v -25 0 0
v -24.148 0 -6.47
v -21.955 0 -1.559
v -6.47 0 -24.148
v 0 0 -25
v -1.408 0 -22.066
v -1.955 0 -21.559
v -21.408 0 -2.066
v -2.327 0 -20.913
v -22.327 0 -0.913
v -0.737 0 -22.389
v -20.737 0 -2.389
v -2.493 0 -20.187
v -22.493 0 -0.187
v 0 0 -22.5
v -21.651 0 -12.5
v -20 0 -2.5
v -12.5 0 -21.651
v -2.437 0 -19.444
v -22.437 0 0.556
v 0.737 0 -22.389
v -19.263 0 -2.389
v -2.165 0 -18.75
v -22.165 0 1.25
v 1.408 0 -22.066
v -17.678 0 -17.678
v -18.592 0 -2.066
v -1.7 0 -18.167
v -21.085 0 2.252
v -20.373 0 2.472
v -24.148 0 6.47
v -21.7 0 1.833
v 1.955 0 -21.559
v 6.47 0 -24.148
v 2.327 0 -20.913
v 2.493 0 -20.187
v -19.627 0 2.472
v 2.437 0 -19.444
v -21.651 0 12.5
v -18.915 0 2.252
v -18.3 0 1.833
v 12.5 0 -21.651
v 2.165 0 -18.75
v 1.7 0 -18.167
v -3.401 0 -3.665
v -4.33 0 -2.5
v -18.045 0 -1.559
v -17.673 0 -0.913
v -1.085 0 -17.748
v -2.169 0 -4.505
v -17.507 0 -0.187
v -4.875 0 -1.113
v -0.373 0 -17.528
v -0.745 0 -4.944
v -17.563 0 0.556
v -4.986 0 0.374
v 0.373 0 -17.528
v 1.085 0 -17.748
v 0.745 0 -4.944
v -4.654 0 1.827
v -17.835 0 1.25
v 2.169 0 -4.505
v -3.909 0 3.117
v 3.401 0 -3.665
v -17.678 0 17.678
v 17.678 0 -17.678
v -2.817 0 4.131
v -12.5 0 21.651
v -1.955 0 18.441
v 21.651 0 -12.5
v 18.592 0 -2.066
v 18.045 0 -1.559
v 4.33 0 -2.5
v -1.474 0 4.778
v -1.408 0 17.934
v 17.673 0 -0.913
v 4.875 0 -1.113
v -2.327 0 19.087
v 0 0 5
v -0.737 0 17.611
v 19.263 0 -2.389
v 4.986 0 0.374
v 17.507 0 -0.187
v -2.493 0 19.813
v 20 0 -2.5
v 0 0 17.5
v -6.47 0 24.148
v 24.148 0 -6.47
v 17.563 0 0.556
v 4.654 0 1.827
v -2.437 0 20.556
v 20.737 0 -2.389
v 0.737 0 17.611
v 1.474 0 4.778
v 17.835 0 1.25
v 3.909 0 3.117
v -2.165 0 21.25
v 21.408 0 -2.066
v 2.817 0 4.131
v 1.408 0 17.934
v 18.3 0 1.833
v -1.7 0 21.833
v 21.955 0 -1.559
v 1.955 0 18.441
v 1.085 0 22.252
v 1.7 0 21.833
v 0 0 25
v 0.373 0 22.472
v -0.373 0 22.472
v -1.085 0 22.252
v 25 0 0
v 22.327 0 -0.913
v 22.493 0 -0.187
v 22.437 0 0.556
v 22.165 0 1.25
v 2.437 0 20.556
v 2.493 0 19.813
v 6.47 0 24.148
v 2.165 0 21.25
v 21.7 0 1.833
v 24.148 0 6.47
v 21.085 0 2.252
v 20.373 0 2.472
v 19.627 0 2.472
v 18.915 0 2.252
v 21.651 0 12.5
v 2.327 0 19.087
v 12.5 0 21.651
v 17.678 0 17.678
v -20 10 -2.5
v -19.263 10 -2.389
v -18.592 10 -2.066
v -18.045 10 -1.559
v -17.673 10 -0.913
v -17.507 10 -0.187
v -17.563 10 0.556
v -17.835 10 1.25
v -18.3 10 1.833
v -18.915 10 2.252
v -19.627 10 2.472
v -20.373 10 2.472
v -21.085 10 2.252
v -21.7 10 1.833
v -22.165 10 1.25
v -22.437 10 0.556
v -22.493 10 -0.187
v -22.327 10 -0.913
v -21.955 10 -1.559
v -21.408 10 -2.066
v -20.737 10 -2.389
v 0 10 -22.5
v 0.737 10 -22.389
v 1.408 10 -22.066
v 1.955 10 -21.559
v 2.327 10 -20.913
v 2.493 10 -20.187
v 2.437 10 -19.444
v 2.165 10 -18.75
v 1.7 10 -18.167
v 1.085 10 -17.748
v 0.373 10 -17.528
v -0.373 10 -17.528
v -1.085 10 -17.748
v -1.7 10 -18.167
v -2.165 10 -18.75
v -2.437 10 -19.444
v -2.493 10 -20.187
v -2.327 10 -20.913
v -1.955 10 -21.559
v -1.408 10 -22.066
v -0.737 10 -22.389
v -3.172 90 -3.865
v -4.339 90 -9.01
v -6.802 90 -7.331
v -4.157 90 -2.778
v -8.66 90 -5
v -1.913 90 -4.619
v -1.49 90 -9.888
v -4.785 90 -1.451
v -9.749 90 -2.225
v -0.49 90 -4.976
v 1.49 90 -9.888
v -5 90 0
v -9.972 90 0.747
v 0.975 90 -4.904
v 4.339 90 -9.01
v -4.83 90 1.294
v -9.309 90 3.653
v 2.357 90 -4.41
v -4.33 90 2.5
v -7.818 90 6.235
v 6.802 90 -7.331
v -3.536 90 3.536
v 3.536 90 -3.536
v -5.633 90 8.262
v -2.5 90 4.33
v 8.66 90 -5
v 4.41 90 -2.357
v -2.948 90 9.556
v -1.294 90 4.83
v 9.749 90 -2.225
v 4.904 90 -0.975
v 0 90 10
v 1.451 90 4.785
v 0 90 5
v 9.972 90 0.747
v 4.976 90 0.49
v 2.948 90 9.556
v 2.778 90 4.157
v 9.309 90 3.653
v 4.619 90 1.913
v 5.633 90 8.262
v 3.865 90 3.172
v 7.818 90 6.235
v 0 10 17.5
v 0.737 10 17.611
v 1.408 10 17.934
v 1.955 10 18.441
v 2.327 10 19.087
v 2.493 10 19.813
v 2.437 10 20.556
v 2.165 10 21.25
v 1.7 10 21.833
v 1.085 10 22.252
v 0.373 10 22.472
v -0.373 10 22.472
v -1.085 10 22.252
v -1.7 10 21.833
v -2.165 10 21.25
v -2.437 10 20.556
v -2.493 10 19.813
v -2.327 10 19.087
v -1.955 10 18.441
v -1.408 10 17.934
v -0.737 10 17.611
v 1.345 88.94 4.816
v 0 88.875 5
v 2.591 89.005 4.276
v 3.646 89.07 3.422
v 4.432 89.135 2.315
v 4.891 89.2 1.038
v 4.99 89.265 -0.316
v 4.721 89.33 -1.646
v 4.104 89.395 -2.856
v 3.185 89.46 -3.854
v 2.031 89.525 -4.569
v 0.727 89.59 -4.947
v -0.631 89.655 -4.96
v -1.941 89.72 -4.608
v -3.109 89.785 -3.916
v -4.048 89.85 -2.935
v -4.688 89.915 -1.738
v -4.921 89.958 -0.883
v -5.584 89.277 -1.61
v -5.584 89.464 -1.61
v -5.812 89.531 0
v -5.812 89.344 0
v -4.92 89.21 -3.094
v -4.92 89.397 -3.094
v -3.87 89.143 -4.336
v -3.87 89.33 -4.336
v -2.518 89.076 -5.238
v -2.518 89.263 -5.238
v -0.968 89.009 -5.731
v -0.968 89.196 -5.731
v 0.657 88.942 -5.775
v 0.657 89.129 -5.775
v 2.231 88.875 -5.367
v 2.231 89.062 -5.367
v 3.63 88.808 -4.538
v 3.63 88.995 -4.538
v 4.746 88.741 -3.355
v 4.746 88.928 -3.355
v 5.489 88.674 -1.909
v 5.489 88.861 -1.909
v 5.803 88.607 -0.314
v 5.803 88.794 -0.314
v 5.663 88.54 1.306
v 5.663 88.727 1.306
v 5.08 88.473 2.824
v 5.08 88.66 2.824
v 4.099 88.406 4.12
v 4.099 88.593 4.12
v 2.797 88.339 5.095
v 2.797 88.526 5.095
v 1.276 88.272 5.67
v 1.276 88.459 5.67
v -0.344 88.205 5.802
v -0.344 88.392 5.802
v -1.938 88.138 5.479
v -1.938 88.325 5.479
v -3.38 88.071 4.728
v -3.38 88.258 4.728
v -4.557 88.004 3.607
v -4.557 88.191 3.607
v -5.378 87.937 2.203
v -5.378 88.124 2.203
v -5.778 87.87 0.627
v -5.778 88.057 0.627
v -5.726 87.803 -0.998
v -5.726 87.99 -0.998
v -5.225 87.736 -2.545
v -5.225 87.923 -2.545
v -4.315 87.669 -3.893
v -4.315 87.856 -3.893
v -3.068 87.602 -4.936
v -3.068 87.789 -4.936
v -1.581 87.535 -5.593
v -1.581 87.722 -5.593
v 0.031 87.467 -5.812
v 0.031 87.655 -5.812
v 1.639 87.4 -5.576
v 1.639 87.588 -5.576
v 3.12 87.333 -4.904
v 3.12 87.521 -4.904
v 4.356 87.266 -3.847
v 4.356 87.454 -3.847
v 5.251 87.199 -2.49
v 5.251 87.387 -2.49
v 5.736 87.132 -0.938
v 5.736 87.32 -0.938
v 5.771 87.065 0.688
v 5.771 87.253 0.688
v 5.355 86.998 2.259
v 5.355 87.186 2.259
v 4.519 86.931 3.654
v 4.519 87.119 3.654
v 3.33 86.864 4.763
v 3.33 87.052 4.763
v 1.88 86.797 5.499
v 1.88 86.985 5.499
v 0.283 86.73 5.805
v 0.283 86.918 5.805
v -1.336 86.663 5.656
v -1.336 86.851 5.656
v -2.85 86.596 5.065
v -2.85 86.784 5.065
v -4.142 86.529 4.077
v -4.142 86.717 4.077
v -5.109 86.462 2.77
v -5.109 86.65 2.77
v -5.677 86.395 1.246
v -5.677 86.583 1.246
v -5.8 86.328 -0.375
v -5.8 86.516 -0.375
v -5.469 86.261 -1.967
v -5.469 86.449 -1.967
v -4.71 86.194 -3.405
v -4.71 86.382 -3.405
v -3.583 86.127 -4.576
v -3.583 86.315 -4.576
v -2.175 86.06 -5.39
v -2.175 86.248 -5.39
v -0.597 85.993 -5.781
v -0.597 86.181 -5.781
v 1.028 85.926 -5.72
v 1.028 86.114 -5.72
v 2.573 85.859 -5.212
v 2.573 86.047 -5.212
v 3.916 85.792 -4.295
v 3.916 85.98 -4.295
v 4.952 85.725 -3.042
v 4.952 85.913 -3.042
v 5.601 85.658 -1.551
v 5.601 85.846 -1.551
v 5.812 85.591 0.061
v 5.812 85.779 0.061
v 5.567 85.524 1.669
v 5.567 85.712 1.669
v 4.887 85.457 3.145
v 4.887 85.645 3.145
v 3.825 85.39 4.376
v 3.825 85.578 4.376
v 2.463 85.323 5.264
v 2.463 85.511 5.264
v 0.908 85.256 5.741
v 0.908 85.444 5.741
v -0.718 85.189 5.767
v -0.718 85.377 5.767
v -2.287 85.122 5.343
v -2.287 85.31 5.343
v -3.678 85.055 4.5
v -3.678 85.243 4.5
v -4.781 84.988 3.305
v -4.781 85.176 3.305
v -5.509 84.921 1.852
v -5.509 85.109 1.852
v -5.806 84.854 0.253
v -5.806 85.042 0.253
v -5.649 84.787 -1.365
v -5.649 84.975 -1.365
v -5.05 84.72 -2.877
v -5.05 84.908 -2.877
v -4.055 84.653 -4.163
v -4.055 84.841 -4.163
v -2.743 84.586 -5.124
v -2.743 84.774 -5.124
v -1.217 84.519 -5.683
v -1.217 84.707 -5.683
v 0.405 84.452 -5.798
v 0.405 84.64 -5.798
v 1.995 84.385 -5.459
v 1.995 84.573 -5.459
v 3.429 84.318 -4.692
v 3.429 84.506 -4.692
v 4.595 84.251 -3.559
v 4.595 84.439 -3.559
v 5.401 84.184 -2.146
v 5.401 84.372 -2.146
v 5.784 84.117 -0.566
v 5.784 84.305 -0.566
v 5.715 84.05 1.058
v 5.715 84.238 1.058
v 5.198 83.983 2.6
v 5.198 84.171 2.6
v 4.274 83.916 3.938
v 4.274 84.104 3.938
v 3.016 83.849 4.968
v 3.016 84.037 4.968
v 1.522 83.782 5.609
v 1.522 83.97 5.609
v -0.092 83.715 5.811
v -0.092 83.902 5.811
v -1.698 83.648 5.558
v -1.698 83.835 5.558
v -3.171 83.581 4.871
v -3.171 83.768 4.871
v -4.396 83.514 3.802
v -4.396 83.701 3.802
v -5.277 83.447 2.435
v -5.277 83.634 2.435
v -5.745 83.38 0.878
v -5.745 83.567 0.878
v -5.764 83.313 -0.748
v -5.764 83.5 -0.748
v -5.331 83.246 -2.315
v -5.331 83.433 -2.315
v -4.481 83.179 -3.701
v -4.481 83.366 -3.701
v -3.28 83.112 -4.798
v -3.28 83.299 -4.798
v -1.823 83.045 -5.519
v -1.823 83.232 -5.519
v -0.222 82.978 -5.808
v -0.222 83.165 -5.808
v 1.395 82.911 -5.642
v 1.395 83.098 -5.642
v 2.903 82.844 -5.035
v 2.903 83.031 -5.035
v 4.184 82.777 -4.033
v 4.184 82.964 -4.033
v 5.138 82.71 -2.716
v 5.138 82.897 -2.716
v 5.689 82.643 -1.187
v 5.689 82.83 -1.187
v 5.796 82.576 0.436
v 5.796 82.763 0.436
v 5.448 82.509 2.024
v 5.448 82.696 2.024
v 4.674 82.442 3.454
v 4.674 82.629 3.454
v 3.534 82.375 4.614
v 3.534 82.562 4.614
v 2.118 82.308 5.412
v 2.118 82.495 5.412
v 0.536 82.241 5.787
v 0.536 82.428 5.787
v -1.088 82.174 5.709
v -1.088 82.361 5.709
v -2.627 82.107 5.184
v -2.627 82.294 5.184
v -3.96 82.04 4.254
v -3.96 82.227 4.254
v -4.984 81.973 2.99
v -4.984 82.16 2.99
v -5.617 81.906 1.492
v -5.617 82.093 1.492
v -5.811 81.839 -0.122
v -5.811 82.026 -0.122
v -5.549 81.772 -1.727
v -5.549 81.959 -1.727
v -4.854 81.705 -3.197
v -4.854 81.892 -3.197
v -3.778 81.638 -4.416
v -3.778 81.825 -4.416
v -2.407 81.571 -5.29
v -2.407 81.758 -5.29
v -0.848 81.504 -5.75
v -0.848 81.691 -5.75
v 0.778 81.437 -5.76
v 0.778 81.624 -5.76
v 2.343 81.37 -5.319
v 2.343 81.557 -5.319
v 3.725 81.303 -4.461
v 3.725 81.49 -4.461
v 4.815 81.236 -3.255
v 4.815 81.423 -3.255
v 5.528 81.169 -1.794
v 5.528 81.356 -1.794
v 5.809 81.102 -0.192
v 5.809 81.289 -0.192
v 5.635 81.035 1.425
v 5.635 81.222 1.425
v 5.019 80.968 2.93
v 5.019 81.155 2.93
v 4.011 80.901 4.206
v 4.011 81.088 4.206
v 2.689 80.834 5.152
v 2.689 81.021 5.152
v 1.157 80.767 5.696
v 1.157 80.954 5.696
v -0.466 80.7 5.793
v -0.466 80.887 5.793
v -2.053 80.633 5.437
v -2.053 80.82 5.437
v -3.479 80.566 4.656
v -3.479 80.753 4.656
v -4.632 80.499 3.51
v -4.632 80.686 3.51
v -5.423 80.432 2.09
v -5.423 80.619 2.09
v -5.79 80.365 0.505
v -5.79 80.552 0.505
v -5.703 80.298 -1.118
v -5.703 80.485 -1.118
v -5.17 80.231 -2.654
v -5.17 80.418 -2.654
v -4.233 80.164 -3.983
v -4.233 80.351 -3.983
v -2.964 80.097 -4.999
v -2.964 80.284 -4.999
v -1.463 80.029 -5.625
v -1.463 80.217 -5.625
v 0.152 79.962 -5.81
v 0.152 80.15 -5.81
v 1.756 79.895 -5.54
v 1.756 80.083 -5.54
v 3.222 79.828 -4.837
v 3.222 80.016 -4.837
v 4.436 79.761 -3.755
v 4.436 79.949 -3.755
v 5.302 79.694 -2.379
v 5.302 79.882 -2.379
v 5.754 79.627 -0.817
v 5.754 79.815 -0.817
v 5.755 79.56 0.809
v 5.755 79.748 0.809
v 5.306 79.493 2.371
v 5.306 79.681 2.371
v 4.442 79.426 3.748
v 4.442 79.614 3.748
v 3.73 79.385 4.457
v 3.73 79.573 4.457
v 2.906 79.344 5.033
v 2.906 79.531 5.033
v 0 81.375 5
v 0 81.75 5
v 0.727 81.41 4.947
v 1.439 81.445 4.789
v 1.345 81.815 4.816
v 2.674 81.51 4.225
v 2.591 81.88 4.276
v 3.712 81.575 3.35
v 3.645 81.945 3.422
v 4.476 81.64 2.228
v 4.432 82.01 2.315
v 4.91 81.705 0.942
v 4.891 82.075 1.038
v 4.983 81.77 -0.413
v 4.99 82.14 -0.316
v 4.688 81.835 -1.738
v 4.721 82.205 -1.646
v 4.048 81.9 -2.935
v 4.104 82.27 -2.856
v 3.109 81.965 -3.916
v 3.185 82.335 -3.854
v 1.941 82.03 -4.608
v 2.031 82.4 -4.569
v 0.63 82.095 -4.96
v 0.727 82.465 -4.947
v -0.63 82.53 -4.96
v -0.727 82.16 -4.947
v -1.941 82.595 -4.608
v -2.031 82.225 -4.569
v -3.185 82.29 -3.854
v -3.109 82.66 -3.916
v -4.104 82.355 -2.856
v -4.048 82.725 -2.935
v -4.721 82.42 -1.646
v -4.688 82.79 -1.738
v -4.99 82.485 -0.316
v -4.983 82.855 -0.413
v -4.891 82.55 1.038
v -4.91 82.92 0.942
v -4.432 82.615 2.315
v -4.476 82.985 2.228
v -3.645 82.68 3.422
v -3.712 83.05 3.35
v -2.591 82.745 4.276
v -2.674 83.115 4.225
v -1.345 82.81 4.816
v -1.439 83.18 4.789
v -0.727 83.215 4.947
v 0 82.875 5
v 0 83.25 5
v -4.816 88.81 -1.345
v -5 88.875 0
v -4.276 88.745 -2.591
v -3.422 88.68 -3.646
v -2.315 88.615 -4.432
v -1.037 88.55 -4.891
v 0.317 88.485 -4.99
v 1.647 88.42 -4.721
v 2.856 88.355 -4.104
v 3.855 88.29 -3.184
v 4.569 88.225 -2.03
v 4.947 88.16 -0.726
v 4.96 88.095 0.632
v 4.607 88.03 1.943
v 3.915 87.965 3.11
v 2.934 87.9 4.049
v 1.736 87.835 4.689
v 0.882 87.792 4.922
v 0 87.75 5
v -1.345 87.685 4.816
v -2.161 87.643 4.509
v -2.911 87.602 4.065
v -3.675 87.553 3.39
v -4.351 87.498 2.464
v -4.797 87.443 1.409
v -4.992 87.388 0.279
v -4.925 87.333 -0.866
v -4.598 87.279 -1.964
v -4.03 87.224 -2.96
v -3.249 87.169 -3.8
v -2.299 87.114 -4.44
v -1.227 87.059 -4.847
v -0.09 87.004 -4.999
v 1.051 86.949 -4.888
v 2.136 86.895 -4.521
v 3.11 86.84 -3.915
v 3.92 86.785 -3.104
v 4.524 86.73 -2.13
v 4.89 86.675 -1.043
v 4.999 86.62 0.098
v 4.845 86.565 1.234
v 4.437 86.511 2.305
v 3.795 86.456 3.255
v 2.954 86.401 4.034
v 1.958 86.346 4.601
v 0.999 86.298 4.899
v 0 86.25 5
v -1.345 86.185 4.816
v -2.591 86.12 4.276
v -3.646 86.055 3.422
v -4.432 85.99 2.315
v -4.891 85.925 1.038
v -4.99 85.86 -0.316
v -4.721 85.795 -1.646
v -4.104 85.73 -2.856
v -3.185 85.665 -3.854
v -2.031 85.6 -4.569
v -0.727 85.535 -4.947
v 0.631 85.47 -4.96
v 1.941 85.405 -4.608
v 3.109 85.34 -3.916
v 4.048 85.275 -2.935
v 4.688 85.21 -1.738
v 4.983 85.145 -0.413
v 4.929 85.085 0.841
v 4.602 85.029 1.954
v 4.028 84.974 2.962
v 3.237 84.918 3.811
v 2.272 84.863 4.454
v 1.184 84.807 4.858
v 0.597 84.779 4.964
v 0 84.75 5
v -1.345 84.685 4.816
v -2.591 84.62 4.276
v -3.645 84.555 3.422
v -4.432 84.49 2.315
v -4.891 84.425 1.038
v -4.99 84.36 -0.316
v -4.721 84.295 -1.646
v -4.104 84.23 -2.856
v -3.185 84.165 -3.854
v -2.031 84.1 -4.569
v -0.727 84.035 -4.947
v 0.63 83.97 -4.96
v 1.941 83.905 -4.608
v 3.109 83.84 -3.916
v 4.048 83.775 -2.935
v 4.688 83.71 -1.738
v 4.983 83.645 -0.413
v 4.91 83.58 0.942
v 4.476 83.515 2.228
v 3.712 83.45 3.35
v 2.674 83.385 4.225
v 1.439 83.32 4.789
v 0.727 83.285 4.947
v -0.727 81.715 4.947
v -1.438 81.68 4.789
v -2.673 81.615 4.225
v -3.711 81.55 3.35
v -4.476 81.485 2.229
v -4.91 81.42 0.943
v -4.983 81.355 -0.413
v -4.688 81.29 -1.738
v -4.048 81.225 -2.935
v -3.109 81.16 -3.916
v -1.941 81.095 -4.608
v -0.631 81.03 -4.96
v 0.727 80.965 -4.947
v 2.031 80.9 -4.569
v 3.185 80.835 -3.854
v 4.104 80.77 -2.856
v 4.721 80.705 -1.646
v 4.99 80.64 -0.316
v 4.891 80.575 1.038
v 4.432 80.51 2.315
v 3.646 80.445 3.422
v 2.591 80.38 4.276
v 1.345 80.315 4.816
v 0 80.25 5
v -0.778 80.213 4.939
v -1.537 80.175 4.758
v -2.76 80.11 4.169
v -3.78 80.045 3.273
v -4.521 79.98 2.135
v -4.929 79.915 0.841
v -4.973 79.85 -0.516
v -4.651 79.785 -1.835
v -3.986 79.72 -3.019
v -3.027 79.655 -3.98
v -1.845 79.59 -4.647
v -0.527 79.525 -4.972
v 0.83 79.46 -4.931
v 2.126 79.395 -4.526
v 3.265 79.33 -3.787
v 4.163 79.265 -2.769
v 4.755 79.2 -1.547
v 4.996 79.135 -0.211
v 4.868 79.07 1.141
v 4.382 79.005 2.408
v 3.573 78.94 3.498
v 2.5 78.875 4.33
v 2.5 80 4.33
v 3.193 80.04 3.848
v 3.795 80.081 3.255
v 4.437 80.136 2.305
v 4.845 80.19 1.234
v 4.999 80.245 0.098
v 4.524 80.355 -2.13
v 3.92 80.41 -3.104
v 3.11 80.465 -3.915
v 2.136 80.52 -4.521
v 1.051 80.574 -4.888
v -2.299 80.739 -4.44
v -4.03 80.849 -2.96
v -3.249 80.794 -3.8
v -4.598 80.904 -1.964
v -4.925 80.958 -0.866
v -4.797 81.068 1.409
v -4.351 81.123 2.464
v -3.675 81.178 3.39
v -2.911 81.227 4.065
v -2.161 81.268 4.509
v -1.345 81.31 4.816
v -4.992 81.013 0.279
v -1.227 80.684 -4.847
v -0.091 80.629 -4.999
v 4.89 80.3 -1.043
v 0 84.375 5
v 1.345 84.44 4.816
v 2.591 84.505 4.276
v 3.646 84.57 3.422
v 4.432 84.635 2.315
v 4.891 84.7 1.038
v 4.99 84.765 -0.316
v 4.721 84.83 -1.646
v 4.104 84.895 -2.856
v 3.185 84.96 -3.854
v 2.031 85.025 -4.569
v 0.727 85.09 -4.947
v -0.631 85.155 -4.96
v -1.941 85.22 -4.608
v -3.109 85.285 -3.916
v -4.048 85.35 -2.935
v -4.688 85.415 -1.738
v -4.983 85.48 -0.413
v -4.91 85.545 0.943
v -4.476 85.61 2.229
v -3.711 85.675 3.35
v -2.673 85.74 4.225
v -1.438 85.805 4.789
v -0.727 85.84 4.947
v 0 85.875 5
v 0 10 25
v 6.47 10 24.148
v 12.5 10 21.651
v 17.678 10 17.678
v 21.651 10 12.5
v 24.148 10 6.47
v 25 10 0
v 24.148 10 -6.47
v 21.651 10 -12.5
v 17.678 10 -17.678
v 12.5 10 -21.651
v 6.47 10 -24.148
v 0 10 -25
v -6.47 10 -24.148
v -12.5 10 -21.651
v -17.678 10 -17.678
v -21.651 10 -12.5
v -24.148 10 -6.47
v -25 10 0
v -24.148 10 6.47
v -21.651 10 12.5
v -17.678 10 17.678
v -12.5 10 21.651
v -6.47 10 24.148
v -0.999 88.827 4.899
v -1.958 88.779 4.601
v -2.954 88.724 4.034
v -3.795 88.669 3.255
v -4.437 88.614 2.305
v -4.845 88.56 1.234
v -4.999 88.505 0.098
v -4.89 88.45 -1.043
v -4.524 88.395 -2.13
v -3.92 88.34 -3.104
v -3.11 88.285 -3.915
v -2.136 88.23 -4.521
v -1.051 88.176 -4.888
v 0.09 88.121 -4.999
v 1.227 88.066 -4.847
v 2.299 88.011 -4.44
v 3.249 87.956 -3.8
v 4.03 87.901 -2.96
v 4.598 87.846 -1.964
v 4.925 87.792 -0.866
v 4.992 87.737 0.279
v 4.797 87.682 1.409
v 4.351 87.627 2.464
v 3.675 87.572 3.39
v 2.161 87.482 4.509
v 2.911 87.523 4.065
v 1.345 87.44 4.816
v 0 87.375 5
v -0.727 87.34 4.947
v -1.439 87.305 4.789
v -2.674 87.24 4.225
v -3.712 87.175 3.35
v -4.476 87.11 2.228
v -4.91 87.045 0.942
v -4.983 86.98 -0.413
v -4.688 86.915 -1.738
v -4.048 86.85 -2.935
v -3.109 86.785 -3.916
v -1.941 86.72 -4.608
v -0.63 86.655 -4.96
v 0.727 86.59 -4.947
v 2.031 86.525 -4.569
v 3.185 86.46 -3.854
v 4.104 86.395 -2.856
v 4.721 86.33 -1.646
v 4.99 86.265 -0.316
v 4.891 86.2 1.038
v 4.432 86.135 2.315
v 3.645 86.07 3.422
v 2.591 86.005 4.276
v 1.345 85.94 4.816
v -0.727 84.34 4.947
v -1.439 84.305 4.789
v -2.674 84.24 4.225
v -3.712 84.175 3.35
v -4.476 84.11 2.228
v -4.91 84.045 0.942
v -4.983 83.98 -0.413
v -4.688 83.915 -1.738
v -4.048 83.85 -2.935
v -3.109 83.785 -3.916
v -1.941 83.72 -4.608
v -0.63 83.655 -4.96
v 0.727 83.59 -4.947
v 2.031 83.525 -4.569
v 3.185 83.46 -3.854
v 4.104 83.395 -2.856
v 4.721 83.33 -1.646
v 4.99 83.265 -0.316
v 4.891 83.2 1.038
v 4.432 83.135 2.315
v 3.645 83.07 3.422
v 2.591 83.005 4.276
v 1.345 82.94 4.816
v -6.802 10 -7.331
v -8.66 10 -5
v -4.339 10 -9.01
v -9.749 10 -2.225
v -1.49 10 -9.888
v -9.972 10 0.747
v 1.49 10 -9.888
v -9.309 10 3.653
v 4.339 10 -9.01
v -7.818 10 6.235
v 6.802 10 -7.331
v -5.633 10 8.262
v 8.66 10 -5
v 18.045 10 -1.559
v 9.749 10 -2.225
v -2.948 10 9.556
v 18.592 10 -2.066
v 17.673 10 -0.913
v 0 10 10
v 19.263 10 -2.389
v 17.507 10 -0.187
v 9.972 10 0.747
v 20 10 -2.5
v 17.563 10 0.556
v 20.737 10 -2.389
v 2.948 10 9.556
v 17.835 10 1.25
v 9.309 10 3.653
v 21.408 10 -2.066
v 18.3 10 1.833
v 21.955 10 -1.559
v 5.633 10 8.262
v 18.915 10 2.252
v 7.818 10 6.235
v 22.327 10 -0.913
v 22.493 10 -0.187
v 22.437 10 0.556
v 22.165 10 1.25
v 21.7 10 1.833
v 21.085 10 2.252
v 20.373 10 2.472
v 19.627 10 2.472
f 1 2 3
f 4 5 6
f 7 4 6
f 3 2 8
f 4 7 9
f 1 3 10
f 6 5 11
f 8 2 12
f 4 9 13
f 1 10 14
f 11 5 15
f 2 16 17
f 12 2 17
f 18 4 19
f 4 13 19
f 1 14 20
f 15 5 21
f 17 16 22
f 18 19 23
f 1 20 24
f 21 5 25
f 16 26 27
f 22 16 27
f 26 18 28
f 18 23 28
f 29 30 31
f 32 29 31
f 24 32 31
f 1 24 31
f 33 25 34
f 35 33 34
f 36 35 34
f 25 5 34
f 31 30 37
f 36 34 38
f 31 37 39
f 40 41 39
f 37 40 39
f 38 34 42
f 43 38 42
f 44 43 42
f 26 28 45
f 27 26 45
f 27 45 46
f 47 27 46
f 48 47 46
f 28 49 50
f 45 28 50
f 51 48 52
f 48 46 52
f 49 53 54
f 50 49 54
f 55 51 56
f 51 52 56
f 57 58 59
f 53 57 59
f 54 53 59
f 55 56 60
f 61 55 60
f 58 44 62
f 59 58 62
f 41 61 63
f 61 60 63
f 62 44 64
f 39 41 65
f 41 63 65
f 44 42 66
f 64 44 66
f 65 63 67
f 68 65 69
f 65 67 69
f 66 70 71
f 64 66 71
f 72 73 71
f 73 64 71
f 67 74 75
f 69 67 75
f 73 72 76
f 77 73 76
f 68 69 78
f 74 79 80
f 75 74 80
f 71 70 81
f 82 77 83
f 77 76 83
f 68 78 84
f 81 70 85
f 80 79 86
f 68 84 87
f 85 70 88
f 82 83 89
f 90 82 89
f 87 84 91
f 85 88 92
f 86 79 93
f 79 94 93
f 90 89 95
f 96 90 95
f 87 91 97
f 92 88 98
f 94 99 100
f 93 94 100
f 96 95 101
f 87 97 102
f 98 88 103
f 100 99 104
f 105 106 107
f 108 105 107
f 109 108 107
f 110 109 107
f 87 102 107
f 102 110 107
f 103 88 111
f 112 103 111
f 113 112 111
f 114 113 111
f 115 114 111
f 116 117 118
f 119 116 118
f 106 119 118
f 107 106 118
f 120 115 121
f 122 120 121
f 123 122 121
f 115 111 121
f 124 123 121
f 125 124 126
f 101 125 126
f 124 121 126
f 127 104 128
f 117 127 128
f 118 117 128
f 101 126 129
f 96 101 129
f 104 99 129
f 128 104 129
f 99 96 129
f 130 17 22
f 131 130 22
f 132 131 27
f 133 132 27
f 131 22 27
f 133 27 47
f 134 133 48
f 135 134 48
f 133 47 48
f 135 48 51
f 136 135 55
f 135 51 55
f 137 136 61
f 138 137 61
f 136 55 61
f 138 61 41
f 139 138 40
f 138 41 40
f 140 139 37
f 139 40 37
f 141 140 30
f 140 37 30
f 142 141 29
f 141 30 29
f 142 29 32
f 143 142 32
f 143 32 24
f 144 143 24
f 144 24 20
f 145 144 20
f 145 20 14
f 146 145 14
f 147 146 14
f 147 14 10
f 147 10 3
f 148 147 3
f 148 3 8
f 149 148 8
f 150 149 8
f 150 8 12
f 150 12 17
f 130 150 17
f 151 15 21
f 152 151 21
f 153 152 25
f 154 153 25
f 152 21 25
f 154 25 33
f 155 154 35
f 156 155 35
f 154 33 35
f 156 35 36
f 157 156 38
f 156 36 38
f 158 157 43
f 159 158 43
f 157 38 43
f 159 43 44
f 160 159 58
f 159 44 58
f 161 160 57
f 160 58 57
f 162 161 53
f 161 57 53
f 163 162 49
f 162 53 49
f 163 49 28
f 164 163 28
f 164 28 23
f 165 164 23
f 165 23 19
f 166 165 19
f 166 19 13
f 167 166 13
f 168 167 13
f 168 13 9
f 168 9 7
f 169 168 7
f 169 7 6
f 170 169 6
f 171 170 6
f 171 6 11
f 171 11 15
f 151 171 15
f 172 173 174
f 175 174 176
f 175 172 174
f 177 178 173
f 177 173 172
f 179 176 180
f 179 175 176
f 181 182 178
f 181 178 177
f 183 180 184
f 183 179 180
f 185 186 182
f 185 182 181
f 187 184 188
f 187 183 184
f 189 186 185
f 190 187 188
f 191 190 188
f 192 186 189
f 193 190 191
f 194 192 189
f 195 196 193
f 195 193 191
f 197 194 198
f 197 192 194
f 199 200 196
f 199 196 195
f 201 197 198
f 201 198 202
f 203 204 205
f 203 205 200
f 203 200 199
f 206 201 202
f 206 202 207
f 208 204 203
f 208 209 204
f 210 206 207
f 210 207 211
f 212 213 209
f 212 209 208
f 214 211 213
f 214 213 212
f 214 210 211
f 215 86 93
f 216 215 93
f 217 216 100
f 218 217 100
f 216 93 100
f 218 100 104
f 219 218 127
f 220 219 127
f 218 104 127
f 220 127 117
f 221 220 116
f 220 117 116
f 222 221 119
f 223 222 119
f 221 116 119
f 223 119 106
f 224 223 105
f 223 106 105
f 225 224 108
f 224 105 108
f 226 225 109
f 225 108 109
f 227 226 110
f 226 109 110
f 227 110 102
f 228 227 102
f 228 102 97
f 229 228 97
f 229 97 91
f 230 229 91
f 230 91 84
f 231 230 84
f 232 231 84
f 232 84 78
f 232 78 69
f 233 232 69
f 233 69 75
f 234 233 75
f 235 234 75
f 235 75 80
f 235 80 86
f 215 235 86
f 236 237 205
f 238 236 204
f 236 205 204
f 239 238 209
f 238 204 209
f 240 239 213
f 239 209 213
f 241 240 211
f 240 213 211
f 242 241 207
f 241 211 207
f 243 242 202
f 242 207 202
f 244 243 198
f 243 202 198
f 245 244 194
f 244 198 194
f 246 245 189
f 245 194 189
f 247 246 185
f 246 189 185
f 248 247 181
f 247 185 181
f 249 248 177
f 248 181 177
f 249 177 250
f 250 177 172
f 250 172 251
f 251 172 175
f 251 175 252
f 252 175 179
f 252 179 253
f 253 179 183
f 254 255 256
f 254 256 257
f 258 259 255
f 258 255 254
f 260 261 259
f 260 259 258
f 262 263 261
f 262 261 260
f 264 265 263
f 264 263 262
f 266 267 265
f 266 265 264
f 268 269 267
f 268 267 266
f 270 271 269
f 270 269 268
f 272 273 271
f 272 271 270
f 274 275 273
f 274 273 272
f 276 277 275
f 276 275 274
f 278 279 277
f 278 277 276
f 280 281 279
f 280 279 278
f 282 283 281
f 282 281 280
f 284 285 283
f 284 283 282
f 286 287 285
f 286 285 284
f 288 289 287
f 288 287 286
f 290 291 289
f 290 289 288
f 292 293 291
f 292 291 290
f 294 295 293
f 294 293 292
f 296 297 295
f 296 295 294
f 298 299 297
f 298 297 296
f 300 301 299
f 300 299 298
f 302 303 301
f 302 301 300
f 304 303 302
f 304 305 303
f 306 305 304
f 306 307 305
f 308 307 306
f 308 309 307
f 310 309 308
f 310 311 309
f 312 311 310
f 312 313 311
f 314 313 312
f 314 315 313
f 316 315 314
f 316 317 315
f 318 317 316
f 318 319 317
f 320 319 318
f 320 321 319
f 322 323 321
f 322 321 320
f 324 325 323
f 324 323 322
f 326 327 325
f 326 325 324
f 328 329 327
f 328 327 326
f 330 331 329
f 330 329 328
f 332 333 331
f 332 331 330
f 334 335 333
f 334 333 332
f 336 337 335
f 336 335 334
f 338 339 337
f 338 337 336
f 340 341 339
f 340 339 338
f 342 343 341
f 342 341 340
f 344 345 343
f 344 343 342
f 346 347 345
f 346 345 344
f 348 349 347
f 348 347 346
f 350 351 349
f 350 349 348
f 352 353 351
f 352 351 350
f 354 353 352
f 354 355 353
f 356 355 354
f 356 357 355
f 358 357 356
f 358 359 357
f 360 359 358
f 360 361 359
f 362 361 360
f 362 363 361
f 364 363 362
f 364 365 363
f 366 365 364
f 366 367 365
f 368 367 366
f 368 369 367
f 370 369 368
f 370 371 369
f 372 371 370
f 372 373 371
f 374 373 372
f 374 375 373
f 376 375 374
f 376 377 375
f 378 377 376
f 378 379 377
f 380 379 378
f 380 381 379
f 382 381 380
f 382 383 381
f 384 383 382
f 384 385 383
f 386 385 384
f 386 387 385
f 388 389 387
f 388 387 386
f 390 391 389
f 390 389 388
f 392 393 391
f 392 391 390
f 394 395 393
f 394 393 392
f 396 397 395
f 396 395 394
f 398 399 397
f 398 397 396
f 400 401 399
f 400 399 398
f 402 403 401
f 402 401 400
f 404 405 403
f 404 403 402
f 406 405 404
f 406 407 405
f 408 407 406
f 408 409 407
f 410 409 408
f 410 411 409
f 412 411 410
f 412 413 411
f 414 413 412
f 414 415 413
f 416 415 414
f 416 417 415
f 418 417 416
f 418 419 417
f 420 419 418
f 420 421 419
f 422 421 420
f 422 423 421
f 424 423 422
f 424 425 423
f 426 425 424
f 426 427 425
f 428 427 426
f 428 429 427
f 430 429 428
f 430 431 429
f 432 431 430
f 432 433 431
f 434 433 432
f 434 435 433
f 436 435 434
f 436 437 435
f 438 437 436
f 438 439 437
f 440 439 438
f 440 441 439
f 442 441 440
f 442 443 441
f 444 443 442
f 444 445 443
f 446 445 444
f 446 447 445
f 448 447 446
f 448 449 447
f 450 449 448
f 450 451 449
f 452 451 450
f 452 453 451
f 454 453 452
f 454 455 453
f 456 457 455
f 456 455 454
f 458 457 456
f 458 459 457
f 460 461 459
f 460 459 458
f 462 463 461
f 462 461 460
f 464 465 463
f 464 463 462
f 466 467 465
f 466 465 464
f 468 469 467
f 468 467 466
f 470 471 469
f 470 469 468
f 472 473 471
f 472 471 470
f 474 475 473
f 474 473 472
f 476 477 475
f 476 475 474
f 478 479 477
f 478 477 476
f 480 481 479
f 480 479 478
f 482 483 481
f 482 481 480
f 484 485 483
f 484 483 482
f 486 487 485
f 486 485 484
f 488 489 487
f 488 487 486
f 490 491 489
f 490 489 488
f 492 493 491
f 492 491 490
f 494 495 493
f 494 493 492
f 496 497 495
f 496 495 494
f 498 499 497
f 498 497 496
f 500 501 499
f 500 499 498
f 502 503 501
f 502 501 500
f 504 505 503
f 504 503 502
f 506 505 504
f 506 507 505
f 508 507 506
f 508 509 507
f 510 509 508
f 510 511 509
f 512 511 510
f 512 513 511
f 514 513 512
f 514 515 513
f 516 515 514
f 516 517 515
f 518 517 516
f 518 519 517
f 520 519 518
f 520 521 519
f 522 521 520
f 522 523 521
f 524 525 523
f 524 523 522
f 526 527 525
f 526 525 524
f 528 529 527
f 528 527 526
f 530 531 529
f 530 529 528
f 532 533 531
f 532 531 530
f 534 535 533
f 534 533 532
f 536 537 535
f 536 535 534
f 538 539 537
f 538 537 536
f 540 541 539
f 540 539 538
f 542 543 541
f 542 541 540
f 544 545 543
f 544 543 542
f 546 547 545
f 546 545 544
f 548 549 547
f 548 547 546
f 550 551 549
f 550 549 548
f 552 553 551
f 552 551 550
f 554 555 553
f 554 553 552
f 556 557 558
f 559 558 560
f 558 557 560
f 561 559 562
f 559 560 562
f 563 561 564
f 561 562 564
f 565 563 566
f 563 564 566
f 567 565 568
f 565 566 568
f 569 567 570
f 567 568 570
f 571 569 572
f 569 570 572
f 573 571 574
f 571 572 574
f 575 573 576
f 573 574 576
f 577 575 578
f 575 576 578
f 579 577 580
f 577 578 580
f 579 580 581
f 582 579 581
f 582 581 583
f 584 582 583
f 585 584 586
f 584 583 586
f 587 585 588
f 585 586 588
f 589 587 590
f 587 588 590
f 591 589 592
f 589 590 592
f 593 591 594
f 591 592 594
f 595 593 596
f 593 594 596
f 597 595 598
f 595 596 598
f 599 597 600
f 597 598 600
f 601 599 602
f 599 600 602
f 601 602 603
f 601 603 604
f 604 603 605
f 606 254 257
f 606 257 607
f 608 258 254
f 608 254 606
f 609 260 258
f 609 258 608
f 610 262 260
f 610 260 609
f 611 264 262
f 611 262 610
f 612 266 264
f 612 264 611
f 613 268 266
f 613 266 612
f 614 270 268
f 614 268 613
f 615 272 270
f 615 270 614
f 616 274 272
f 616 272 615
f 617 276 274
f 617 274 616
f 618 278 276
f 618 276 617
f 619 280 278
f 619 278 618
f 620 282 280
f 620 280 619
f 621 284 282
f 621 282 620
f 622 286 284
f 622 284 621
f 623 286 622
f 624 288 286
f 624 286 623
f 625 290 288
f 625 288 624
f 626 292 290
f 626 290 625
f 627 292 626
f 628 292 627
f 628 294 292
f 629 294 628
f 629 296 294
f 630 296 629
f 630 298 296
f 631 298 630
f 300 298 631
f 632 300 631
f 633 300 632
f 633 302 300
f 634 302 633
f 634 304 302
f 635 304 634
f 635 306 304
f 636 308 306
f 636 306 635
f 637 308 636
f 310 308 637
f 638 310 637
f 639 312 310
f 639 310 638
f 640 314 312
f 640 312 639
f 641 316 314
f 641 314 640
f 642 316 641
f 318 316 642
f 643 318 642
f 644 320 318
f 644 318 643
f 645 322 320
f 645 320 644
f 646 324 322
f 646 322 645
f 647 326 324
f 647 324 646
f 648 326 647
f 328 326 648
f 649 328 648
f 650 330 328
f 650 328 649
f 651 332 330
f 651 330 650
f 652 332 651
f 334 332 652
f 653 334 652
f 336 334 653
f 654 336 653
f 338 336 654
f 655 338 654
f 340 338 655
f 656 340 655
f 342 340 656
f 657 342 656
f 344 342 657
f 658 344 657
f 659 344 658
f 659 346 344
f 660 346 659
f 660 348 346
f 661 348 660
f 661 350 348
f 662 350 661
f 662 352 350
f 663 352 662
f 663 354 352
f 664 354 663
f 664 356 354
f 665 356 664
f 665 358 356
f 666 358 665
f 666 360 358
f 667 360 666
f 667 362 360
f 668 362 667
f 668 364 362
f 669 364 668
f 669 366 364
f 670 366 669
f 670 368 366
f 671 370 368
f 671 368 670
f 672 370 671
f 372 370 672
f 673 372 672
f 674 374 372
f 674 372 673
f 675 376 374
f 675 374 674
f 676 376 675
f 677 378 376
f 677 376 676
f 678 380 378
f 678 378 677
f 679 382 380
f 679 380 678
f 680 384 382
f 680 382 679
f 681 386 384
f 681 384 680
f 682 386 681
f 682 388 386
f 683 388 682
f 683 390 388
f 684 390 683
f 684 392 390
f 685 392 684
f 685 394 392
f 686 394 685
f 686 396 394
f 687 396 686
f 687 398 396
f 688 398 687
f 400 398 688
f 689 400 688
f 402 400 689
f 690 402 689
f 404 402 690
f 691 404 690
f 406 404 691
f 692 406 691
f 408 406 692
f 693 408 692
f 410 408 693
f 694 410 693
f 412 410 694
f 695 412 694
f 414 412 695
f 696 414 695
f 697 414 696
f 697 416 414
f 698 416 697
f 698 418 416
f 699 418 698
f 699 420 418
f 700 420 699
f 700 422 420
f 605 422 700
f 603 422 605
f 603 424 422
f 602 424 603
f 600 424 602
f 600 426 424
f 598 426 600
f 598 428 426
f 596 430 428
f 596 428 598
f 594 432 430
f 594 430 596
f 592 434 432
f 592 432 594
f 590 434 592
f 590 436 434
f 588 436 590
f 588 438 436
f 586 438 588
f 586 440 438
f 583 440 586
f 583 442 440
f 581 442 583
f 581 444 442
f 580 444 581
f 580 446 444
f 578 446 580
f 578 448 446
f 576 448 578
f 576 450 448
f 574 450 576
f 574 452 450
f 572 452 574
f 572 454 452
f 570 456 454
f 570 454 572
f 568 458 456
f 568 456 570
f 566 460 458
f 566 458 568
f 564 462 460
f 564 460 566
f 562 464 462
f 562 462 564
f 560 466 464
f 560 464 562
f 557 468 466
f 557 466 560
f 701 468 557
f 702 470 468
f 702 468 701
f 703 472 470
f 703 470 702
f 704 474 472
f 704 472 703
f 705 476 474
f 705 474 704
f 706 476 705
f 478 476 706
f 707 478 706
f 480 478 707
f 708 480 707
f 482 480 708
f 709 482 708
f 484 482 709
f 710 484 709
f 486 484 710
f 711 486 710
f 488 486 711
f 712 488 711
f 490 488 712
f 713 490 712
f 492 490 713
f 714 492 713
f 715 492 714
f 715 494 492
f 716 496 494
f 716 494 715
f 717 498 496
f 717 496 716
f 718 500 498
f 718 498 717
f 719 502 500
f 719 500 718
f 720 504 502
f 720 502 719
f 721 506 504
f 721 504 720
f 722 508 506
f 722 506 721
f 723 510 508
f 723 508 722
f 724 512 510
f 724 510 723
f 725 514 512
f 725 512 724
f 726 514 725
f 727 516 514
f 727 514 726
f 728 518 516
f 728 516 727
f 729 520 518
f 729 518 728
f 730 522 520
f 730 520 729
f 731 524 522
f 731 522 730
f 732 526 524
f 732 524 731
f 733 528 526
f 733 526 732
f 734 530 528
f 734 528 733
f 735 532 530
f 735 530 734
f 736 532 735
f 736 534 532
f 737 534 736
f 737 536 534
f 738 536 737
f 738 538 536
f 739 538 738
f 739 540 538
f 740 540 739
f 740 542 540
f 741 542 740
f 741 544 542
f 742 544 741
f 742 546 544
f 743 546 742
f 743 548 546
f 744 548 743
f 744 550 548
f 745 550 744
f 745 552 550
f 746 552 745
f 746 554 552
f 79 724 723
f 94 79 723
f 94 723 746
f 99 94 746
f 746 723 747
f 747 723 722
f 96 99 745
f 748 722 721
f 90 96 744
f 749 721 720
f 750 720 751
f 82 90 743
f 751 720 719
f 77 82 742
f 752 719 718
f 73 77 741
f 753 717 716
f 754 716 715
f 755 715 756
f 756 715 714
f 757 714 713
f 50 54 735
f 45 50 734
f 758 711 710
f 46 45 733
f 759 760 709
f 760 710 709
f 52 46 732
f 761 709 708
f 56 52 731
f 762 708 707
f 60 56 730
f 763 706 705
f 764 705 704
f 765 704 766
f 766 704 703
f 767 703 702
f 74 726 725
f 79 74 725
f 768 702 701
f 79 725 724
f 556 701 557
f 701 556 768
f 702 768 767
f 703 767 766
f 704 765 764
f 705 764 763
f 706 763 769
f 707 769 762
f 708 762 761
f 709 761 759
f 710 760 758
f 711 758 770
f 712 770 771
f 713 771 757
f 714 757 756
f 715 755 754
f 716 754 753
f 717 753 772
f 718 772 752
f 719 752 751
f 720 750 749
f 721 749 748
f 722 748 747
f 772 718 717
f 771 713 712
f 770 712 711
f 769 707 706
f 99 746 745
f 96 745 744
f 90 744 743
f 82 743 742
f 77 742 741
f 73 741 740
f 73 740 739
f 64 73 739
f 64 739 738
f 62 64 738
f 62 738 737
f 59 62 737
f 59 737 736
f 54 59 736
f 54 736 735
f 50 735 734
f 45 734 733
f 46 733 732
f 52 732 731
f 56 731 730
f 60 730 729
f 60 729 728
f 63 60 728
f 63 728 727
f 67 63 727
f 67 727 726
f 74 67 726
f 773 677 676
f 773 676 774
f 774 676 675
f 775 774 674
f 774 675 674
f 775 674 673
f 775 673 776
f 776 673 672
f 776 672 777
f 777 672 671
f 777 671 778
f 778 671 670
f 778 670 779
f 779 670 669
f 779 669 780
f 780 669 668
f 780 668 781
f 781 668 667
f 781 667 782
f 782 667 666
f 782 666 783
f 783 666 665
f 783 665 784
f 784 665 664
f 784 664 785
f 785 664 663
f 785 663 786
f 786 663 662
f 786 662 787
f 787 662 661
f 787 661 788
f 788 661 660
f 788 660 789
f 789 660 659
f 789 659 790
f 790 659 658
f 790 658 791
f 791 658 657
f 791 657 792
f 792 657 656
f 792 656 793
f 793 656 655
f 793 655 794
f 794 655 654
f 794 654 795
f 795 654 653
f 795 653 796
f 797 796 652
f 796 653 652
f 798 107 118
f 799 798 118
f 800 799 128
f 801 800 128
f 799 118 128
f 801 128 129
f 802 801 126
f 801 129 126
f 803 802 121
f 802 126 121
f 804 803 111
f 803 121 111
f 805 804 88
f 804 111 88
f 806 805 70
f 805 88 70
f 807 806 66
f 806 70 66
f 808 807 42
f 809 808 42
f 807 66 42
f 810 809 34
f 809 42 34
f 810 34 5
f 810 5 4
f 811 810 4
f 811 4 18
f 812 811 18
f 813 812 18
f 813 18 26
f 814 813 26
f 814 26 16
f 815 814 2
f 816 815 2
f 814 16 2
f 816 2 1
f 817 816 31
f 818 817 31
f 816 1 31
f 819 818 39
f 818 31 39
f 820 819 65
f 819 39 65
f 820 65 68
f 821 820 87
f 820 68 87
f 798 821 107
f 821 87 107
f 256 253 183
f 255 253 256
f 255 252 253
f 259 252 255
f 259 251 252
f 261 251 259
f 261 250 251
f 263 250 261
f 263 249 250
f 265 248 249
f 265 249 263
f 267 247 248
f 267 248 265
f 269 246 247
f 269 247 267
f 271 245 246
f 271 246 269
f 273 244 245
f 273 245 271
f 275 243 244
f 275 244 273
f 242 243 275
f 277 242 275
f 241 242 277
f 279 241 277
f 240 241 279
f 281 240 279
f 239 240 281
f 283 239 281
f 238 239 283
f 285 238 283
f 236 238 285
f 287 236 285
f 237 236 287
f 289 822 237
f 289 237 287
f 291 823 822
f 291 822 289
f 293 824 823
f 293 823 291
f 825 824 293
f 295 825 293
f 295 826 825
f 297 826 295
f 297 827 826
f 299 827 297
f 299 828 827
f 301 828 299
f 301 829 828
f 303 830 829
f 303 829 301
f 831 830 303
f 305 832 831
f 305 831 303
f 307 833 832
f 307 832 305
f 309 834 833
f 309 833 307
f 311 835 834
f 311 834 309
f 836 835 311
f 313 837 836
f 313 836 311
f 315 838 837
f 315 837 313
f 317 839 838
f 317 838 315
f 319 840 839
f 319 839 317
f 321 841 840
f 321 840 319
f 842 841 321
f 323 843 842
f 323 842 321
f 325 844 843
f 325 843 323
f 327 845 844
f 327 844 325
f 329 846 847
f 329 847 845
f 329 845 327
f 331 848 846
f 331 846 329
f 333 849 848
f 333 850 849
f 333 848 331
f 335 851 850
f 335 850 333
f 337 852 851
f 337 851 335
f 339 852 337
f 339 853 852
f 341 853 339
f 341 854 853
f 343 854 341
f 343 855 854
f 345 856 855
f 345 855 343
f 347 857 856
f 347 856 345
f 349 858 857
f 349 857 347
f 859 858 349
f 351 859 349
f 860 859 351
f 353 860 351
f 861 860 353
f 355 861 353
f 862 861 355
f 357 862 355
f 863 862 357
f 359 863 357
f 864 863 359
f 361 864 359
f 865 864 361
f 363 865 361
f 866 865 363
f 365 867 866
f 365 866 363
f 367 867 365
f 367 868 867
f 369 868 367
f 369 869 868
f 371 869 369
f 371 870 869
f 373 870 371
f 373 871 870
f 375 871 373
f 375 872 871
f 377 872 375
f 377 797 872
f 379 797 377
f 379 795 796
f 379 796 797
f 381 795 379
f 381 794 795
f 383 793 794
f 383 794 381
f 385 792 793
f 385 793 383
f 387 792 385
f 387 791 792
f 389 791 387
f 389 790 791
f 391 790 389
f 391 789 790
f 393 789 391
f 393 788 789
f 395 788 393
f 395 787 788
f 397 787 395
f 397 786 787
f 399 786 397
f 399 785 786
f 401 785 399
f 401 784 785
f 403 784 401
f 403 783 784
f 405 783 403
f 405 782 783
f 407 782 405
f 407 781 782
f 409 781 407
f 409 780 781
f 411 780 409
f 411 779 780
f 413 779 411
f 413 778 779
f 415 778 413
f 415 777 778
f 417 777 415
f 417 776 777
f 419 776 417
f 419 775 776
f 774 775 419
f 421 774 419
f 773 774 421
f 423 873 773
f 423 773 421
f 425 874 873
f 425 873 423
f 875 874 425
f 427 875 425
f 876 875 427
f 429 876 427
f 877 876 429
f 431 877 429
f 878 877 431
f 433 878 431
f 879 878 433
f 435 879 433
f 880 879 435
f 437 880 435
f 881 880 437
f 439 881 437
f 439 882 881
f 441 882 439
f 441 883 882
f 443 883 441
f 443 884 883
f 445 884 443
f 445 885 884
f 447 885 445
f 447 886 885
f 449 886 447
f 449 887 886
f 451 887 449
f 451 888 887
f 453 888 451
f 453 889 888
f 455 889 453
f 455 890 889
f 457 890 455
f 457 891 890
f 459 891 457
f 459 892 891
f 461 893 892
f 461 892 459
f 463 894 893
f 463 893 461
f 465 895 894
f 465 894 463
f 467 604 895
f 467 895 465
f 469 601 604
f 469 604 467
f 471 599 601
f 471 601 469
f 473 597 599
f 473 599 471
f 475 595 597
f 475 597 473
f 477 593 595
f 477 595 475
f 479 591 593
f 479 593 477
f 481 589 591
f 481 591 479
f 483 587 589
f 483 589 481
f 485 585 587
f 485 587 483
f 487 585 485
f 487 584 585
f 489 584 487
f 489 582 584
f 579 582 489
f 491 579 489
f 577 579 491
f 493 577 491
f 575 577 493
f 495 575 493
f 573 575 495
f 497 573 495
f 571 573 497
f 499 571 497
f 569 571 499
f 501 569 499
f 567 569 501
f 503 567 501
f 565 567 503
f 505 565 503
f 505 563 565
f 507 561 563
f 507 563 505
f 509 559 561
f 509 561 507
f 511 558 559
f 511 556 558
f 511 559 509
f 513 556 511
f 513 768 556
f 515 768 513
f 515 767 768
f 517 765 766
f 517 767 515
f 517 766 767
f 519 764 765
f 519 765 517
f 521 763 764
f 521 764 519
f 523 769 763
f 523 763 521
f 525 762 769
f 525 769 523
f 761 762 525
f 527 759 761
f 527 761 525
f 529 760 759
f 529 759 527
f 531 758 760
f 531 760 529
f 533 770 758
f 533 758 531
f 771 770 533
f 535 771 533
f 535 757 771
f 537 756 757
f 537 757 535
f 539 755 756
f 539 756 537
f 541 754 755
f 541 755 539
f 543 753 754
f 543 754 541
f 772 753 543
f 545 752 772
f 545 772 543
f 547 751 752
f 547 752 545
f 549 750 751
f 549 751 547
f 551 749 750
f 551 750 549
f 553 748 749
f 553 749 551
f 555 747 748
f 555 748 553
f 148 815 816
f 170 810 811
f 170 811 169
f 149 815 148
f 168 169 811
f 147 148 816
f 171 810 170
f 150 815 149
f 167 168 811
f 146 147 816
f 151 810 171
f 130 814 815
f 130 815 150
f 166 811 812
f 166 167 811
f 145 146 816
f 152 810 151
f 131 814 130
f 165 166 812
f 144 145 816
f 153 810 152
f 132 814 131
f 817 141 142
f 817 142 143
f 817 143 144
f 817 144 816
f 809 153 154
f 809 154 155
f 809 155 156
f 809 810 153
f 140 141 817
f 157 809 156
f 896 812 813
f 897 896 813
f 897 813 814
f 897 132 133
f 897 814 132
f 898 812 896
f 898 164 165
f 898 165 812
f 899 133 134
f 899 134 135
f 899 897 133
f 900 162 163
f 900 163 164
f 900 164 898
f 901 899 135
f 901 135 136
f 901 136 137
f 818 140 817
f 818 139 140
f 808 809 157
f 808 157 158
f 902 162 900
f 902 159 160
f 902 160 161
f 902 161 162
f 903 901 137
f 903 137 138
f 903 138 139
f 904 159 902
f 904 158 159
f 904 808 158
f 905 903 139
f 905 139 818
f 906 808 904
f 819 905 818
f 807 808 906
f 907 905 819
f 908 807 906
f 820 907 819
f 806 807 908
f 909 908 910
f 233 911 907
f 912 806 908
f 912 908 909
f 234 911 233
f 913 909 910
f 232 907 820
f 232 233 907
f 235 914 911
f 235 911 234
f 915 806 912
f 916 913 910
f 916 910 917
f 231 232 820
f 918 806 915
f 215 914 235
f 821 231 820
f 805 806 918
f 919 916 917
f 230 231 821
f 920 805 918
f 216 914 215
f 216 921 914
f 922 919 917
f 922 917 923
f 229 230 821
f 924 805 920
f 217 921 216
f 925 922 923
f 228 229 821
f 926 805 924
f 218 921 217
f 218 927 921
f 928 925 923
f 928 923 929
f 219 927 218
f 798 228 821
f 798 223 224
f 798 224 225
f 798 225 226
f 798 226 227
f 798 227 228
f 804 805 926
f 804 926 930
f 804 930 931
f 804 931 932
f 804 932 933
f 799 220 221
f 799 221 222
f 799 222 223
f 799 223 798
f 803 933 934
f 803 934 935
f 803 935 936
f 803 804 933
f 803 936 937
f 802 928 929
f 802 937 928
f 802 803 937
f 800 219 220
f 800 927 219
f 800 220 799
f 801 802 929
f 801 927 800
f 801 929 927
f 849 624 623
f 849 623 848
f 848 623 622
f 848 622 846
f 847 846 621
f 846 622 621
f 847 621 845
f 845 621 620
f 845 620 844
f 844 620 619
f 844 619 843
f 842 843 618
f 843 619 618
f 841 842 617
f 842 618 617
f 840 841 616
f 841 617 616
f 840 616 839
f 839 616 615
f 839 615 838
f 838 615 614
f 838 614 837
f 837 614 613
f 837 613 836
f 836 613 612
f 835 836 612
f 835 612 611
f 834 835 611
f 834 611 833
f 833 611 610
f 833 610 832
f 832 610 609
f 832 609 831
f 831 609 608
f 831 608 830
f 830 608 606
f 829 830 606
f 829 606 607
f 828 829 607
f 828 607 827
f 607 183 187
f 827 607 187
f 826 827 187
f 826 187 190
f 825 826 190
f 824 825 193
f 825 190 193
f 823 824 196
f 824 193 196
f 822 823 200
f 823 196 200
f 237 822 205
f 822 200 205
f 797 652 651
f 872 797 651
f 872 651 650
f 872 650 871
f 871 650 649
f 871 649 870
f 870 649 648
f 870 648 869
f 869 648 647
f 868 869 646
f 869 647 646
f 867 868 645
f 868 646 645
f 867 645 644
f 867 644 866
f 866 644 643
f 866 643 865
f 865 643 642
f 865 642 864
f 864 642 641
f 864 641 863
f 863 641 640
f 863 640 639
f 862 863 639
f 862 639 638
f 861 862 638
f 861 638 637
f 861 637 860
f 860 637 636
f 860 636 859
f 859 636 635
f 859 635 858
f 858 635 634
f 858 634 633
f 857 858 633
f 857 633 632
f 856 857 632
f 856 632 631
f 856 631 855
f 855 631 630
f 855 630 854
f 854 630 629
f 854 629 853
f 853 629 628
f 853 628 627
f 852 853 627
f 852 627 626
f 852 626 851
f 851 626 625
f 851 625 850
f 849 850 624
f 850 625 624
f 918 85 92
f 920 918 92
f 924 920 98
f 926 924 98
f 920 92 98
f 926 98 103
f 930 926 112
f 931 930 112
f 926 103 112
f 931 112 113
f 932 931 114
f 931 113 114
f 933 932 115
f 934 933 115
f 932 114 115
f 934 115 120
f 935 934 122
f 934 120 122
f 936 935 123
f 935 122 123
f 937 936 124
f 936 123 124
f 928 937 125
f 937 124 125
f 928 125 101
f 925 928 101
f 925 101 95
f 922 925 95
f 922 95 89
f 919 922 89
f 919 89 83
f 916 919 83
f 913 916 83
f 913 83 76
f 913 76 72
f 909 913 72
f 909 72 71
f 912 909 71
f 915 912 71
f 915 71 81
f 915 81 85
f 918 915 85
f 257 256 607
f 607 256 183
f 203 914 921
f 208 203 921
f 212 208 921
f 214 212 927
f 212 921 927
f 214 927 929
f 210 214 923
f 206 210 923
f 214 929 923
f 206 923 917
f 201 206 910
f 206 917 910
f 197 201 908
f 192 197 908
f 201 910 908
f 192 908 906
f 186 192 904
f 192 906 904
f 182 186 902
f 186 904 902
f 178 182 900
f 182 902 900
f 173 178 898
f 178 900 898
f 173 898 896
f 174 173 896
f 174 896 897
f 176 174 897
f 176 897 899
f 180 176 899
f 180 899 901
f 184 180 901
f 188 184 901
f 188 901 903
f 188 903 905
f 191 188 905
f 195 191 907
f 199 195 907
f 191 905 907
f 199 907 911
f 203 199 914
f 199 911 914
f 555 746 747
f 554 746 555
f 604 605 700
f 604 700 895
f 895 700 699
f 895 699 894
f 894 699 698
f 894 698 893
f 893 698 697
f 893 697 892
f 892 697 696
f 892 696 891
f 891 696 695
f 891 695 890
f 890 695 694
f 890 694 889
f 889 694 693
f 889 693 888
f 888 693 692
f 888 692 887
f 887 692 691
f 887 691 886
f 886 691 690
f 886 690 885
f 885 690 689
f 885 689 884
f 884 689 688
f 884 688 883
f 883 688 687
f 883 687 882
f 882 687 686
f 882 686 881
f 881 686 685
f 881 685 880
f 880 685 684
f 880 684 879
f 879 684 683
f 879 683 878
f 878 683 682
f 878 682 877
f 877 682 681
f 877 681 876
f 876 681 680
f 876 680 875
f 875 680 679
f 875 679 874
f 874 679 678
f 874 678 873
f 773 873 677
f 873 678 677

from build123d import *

# Parameters (mm, degrees)
SKETCH1_R           = 25
BOSS_EXTRUDE1_DEPTH = 10
SKETCH2_R           = 10
BOSS_EXTRUDE2_DEPTH = 80
SKETCH3_R           = 5
CUT_EXTRUDE1_DEPTH  = 97.695398029
THREAD1_PITCH       = 1.5
THREAD1_HEIGHT      = 10
THREAD1_RADIUS      = 5
THREAD1_START_ANGLE = -90
SKETCH6_R           = 2.5
CUT_EXTRUDE2_DEPTH  = 97.695398122


with BuildPart() as part:
    # Sketch1 → Boss-Extrude1 (new body)
    with BuildSketch(Plane(origin=(0, 0, 0), x_dir=(1, 0, 0), z_dir=(0, 1, 0))):
        with Locations(Location((0, 0, 0), (0, 0, 270))):
            Circle(SKETCH1_R)
    extrude(amount=BOSS_EXTRUDE1_DEPTH)

    # Sketch2 → Boss-Extrude2 (add)
    with BuildSketch(Plane(origin=(0, 10, 0), x_dir=(1, 0, 0), z_dir=(0, 1, 0))):
        with Locations(Location((0, 0, 0), (0, 0, 270))):
            Circle(SKETCH2_R)
    extrude(amount=BOSS_EXTRUDE2_DEPTH)

    # Sketch3 → Cut-Extrude1 (cut, through all)
    with BuildSketch(Plane(origin=(0, 90, 0), x_dir=(1, 0, 0), z_dir=(0, 1, 0))):
        with Locations(Location((0, 0, 0), (0, 0, 270))):
            Circle(SKETCH3_R)
    extrude(amount=-CUT_EXTRUDE1_DEPTH, mode=Mode.SUBTRACT)

    # Thread1: sweep along a helix
    with BuildLine() as thread1_path:
        add(Helix(THREAD1_PITCH, THREAD1_HEIGHT, THREAD1_RADIUS, center=(0, 90, 0), direction=(0, -1, 0), mode=Mode.PRIVATE).rotate(Axis((0, 90, 0), (0, -1, 0)), THREAD1_START_ANGLE))
    # Thread Profile1 → Thread1 (sweep, cut)
    with BuildSketch(Plane(origin=(-5, 90, 0), x_dir=(-1, 0, 0), z_dir=(0, 0, 1))):
        Polygon((0, 0), (0.811898813, 0.468749998), (0.811898813, 0.656249998), (0, 1.124999996), align=None)
    sweep(path=thread1_path.line, is_frenet=True, mode=Mode.SUBTRACT)

    # Sketch6 → Cut-Extrude2 (cut, through all)
    with BuildSketch(Plane.XZ):
        with Locations(Location((0, 20, 0), (0, 0, 270))):
            Circle(SKETCH6_R)
        with Locations(Location((20, 0, 0), (0, 0, 270))):
            Circle(SKETCH6_R)
        with Locations(Location((0, -20, 0), (0, 0, 270))):
            Circle(SKETCH6_R)
        with Locations(Location((-20, 0, 0), (0, 0, 270))):
            Circle(SKETCH6_R)
    extrude(amount=-CUT_EXTRUDE2_DEPTH, mode=Mode.SUBTRACT)


solid = part.part
